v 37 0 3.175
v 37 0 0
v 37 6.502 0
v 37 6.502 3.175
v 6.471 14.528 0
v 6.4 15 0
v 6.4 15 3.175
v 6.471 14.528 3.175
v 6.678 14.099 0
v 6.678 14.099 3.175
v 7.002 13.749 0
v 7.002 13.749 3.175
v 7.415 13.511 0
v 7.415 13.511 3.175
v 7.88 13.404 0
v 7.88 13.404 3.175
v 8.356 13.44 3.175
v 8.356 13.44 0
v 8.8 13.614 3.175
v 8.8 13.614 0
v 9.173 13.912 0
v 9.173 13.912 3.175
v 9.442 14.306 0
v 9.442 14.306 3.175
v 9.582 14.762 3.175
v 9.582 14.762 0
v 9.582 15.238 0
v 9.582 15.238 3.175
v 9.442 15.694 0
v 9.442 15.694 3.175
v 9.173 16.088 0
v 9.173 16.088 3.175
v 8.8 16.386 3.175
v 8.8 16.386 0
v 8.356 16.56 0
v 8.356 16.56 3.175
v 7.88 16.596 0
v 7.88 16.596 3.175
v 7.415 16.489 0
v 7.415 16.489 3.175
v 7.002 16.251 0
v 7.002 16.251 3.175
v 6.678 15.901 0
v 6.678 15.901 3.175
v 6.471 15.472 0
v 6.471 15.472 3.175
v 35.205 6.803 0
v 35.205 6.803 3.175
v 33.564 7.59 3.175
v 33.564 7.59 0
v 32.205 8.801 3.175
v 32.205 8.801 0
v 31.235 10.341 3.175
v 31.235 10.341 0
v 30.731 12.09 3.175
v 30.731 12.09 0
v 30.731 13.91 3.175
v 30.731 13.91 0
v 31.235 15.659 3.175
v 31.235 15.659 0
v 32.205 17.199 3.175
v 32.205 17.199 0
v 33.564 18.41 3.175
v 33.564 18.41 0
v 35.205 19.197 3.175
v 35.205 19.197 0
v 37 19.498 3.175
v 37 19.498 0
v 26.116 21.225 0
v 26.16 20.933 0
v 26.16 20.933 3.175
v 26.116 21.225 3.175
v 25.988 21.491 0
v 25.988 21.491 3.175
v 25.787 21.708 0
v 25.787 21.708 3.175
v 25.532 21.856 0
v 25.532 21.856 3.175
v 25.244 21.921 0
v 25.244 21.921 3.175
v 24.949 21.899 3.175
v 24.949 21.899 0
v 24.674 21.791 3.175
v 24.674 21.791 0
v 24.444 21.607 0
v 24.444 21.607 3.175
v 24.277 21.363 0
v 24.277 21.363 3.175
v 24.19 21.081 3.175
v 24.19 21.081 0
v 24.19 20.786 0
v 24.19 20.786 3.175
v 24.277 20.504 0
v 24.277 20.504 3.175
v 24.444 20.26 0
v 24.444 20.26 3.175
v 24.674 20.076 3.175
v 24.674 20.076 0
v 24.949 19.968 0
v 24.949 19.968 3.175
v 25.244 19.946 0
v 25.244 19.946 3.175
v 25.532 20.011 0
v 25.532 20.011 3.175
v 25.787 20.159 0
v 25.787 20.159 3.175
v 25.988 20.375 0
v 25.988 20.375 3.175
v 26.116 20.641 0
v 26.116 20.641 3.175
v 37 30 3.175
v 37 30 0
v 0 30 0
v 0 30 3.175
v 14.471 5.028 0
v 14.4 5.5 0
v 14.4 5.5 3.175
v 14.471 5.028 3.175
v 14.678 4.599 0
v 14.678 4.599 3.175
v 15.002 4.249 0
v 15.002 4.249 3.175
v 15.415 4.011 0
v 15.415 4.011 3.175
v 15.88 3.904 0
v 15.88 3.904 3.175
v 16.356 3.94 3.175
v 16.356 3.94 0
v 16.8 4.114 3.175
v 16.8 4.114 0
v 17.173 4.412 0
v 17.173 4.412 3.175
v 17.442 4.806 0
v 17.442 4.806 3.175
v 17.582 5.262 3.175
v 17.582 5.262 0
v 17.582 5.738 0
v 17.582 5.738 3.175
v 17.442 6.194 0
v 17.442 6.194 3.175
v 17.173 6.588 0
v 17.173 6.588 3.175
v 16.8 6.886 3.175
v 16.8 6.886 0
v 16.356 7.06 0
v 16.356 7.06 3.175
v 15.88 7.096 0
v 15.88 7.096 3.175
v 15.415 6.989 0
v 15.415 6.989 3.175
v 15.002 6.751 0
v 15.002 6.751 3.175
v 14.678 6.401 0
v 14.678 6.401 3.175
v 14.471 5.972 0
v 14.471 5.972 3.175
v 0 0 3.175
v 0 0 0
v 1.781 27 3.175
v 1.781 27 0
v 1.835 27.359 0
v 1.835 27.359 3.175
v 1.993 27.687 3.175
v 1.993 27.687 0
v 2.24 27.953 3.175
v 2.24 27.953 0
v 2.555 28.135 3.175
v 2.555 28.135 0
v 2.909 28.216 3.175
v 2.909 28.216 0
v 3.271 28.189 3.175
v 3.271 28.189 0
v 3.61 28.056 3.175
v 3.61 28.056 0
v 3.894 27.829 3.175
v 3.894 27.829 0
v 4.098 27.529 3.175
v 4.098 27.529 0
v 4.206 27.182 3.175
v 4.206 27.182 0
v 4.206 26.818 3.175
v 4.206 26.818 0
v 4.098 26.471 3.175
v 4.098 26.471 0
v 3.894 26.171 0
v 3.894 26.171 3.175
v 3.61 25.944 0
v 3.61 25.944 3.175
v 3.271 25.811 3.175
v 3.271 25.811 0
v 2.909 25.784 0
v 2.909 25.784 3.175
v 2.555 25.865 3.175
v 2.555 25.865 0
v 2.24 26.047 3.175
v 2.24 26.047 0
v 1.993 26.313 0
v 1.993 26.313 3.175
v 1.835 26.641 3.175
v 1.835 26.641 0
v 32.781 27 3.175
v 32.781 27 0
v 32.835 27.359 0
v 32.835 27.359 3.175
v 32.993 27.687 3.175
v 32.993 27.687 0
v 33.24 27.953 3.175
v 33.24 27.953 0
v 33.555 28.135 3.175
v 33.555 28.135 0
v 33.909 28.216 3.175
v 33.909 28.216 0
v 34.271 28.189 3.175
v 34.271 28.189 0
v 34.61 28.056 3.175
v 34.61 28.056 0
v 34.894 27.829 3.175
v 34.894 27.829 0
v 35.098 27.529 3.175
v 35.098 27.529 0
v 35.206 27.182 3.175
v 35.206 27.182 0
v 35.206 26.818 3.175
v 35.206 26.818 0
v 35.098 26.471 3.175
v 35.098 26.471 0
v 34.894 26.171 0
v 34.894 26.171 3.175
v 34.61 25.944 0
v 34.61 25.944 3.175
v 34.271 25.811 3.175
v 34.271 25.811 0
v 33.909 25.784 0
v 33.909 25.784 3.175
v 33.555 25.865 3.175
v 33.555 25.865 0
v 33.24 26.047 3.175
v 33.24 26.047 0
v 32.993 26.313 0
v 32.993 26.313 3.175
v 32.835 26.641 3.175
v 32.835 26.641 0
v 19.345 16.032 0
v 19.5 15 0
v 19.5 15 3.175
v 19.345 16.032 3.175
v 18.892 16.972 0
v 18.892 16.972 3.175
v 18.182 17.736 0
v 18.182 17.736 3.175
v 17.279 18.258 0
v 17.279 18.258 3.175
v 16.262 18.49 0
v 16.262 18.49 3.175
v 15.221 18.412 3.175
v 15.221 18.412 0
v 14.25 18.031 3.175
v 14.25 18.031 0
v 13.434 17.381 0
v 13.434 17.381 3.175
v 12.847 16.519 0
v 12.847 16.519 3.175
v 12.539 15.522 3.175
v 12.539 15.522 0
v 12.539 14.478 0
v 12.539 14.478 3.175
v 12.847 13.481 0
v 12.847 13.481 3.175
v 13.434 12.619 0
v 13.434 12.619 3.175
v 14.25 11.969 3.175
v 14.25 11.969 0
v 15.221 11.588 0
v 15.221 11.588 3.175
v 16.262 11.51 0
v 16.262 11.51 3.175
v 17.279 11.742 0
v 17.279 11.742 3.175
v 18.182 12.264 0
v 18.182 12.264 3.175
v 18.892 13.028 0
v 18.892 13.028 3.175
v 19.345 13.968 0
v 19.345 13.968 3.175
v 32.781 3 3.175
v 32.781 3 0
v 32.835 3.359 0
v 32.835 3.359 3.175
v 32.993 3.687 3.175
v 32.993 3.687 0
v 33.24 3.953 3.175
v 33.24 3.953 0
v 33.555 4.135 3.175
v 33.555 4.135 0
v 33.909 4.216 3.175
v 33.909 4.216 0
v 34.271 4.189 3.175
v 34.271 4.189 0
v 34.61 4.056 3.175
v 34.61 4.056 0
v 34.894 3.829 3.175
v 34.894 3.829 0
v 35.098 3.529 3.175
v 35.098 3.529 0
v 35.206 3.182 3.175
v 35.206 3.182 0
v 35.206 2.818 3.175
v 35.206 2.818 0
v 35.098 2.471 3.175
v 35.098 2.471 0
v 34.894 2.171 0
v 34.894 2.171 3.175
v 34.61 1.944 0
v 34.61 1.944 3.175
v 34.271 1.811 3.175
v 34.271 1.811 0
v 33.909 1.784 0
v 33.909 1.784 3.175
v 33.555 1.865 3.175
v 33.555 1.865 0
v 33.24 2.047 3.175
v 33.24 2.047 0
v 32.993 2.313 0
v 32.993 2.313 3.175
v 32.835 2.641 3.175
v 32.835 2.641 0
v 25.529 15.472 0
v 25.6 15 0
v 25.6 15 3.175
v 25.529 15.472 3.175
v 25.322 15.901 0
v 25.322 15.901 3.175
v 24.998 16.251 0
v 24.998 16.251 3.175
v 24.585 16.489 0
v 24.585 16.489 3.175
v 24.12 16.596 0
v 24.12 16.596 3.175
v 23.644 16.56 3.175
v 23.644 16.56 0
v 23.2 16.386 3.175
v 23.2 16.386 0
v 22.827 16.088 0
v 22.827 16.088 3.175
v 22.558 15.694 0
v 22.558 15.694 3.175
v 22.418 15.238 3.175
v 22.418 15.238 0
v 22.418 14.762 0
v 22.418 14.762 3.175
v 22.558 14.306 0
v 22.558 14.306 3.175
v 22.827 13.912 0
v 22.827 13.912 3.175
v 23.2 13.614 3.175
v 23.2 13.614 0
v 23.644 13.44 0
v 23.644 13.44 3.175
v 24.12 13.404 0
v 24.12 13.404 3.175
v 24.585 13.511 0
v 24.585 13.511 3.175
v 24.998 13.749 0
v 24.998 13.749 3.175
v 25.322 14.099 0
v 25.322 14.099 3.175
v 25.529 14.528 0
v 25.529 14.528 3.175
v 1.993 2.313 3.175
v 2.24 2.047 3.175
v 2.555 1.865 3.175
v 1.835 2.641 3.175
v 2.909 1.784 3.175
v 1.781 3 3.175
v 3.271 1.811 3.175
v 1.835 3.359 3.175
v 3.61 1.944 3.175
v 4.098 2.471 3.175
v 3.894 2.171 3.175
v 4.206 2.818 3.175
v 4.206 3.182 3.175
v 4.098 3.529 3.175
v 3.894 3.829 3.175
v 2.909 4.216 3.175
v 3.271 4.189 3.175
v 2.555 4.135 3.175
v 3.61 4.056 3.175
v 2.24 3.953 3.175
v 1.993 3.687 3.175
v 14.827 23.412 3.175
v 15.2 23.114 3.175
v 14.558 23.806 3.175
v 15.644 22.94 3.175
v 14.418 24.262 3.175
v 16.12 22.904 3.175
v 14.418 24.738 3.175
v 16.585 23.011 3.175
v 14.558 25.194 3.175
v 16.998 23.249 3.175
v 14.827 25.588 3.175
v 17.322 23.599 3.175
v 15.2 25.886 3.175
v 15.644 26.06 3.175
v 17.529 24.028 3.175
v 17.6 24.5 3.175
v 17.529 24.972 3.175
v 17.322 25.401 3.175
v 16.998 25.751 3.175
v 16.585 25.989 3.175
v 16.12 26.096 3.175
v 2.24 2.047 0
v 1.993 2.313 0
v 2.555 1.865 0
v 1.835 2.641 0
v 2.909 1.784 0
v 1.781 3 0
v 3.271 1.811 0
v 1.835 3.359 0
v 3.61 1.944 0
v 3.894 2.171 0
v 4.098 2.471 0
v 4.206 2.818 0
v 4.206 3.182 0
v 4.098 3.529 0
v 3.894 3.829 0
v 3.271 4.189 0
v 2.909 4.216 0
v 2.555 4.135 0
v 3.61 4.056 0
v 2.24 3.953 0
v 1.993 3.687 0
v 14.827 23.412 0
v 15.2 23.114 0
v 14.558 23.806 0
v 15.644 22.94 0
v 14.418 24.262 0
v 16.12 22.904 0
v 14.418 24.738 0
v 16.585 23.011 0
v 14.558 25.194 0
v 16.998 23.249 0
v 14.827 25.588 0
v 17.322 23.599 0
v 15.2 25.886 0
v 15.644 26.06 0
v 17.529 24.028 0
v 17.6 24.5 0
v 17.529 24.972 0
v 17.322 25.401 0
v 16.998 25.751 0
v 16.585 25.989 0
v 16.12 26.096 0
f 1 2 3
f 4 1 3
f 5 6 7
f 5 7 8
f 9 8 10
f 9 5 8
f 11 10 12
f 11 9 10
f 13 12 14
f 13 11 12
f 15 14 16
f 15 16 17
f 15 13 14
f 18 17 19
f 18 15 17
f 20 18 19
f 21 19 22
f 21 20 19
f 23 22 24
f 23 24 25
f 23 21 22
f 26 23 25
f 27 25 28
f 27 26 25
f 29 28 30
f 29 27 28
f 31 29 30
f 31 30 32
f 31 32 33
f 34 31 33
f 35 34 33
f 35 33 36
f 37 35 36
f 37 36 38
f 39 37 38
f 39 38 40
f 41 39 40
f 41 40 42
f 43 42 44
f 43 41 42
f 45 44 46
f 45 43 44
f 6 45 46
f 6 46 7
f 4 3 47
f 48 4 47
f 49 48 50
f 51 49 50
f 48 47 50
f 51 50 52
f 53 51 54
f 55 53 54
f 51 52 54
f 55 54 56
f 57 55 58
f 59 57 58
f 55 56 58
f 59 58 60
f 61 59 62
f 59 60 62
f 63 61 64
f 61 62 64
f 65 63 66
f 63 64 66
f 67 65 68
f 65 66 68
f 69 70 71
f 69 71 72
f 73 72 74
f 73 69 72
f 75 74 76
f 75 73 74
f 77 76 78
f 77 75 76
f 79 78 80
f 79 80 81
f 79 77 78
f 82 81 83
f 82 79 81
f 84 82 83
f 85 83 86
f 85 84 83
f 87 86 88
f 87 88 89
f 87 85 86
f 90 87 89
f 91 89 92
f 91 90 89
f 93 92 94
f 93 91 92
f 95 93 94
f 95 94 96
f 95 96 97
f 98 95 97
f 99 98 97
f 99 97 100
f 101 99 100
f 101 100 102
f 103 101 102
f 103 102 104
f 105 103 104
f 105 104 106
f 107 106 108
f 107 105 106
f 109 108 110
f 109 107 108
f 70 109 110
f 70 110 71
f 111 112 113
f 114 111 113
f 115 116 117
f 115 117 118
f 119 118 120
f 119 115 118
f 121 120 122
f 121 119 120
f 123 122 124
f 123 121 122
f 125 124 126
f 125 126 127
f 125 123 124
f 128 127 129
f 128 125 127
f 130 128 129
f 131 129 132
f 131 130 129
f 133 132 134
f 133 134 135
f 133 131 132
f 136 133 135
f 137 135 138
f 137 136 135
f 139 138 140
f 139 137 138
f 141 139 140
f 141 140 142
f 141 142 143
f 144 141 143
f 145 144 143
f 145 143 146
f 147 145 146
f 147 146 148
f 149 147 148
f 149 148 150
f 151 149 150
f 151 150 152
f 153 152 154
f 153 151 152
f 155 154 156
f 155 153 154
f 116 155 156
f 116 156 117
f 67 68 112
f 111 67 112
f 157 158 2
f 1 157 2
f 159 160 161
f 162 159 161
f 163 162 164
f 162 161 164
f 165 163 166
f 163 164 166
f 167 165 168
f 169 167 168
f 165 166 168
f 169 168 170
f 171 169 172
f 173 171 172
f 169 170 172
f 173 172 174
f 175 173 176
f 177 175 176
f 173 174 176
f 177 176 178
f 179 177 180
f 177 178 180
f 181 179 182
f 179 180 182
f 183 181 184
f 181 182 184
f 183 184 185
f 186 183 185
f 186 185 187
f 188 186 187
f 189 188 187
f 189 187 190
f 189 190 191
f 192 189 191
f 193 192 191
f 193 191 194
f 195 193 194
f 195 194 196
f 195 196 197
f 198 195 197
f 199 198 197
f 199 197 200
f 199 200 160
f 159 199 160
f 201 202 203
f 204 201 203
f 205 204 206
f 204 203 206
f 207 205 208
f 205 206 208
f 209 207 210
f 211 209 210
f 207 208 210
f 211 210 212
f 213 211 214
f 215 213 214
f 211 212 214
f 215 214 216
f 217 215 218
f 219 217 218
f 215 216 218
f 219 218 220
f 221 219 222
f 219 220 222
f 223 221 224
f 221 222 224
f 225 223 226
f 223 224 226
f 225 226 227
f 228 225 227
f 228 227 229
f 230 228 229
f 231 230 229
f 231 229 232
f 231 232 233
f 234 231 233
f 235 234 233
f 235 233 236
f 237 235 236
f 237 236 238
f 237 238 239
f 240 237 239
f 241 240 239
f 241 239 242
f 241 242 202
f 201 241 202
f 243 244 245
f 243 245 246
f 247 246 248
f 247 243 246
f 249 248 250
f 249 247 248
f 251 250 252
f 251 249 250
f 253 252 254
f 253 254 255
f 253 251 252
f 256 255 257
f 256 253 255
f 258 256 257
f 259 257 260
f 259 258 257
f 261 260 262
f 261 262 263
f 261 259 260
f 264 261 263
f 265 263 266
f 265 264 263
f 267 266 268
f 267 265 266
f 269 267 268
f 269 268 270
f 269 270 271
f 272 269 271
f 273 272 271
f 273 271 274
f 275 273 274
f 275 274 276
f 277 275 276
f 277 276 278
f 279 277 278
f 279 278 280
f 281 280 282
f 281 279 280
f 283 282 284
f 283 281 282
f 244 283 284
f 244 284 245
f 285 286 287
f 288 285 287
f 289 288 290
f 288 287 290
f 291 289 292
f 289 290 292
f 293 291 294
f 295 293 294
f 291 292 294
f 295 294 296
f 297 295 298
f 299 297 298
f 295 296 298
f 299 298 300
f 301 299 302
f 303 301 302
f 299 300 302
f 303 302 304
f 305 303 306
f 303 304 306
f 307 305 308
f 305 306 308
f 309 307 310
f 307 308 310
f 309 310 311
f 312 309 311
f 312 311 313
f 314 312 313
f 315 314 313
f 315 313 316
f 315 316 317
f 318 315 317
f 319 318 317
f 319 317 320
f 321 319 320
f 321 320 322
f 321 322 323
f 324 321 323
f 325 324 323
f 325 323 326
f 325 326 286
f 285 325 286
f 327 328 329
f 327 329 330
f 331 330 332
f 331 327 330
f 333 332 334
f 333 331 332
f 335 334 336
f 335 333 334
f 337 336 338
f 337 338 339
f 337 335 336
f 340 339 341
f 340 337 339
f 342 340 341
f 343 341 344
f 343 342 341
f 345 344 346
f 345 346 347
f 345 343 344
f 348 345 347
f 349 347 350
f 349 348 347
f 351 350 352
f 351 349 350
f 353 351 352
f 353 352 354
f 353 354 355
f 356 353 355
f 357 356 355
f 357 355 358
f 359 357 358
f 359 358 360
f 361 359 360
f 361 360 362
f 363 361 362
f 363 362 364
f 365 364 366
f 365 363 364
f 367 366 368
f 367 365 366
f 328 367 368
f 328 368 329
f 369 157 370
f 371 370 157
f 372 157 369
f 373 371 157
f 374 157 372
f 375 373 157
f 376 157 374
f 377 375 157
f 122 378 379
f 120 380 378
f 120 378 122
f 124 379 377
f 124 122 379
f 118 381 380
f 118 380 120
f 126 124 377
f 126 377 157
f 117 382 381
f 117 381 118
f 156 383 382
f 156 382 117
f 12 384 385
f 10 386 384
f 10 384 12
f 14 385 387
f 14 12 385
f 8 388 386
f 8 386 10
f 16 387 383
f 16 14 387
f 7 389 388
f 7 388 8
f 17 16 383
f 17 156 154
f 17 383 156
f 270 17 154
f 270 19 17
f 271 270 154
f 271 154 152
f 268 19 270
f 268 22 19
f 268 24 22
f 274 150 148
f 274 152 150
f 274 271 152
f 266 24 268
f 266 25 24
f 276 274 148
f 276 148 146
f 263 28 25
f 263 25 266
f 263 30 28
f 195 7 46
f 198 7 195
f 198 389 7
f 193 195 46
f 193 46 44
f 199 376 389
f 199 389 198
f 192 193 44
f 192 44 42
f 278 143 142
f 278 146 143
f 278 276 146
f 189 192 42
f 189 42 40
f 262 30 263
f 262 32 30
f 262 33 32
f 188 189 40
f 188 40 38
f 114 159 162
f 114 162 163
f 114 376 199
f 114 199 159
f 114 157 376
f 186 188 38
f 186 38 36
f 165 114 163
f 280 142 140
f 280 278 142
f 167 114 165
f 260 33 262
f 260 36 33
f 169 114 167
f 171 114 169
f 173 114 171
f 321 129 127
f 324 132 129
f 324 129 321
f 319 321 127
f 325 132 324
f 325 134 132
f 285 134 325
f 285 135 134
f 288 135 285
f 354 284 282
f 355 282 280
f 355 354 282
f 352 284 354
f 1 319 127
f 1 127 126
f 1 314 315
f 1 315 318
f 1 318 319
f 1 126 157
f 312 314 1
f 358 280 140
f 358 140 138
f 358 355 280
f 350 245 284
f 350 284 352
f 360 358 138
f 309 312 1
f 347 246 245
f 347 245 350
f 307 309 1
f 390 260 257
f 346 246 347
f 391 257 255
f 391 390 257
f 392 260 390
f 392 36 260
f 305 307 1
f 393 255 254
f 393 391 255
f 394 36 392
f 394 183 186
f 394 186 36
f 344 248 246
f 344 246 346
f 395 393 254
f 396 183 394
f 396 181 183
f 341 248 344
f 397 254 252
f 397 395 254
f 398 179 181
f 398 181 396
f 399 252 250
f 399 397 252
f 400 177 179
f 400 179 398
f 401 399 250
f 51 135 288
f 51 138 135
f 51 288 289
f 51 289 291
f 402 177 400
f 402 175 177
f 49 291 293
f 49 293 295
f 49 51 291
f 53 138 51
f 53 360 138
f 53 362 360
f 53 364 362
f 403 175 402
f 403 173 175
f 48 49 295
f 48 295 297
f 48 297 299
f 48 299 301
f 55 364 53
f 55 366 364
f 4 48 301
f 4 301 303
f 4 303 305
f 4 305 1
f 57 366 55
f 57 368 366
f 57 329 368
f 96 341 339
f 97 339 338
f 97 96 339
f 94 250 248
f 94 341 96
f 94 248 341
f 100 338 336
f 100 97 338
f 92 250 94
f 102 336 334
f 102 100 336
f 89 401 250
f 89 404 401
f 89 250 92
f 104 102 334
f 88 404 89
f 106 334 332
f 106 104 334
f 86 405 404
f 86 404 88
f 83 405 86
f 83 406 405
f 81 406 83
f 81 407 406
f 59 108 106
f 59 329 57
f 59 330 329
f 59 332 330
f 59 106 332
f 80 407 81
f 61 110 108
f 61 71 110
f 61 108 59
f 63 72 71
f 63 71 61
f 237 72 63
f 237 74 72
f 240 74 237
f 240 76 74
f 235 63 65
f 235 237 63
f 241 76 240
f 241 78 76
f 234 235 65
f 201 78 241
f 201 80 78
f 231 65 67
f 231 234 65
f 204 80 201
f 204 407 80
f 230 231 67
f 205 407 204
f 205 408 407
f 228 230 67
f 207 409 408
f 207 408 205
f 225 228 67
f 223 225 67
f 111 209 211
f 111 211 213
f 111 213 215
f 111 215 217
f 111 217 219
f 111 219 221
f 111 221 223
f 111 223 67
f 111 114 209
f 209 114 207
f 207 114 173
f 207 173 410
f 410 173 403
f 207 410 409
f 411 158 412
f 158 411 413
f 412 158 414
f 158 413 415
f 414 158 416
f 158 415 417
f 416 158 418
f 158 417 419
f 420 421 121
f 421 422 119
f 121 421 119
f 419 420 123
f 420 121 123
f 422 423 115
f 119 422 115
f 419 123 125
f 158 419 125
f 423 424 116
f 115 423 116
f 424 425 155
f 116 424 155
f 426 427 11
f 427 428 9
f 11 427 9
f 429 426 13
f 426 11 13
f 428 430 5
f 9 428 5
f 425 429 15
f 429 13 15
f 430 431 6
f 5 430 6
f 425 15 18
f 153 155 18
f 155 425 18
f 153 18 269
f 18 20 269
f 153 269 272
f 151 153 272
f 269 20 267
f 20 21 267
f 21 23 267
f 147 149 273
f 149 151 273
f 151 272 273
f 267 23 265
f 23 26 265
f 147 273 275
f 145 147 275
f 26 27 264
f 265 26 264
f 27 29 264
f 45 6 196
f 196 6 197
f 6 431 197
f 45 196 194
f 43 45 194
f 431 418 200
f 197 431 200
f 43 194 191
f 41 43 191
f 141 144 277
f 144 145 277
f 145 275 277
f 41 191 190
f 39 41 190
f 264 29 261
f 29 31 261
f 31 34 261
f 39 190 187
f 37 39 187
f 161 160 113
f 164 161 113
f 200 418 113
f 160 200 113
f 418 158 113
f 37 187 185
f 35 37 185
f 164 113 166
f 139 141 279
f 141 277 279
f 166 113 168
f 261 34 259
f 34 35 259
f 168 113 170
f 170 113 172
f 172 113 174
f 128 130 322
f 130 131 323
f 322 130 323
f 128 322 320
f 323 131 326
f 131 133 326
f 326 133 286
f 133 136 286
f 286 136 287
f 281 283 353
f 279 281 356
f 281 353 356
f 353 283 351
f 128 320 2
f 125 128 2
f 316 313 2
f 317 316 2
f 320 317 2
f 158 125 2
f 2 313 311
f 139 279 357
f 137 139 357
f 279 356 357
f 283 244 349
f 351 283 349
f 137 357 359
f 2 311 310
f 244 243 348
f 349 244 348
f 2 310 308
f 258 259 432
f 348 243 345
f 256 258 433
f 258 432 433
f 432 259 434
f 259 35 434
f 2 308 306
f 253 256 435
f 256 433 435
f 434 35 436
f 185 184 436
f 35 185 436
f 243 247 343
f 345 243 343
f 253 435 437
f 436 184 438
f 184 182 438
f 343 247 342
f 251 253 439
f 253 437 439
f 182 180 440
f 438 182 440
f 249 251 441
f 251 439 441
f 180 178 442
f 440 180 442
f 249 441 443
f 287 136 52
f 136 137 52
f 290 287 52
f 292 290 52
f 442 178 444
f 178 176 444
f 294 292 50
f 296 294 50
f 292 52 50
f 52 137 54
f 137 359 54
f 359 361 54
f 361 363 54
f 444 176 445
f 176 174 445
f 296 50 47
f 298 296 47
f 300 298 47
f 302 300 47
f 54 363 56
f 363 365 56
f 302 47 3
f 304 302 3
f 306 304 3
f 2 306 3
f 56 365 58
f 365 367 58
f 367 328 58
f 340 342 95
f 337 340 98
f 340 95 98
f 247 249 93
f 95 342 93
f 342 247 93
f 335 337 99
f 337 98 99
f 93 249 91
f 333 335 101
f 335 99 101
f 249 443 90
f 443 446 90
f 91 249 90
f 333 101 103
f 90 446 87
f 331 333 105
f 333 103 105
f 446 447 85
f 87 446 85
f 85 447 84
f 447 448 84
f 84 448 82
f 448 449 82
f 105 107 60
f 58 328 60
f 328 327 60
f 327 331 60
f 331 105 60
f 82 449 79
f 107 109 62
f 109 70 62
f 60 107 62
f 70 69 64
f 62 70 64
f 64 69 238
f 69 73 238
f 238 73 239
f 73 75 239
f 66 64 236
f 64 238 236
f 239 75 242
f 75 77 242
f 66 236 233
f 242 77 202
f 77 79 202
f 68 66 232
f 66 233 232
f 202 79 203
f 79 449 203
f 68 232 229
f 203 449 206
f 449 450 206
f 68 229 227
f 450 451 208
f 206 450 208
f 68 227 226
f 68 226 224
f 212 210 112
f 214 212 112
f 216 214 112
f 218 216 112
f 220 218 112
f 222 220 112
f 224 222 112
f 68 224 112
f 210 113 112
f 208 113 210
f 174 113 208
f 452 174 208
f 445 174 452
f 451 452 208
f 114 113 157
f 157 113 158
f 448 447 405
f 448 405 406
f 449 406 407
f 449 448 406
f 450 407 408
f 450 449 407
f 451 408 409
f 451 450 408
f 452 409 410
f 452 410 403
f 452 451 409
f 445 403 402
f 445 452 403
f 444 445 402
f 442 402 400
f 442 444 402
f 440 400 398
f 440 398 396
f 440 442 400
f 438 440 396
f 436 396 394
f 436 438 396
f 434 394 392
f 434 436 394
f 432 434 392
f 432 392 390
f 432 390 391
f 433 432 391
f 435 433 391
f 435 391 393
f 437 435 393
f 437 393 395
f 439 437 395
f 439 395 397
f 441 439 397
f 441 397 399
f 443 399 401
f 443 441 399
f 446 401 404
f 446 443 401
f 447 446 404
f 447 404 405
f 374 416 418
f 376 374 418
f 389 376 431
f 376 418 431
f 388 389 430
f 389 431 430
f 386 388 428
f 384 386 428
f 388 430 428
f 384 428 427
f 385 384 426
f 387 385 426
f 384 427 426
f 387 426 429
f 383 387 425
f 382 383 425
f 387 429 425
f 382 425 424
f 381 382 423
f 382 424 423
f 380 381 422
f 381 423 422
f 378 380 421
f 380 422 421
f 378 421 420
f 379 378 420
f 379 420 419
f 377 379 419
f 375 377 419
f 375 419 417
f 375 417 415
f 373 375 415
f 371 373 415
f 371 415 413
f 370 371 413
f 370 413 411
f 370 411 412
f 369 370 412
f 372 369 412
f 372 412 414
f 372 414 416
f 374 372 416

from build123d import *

# Parameters (mm, degrees)
SKETCH1_R                 = 0.9906
SKETCH1_R_2               = 1.6
SKETCH1_R_3               = 3.5
BOSS_EXTRUDE2_DEPTH       = 3.175
F_2_CLEARANCE_HOLE1_D     = 2.4384
F_2_CLEARANCE_HOLE1_DEPTH = 3.302
F_2_CLEARANCE_HOLE1_TIP   = 0.732569267


with BuildPart() as part:
    # Sketch1 → Boss-Extrude2 (new body)
    with BuildSketch(Plane.XY):
        with BuildLine():
            Line((0, 0), (37, 0))
            Line((37, 0), (37, 6.50213794))
            ThreePointArc((37, 6.50213794), (30.666699296, 13), (37, 19.49786206))
            Line((37, 19.49786206), (37, 30))
            Line((37, 30), (0, 30))
            Line((0, 30), (0, 0))
        make_face()
        with Locations((25.169778966, 20.933400182)):
            Circle(SKETCH1_R, mode=Mode.SUBTRACT)
        with Locations((16, 24.5)):
            Circle(SKETCH1_R_2, mode=Mode.SUBTRACT)
        with Locations((24, 15)):
            Circle(SKETCH1_R_2, mode=Mode.SUBTRACT)
        with Locations(Location((16, 5.5, 0), (0, 0, 180))):
            Circle(SKETCH1_R_2, mode=Mode.SUBTRACT)
        with Locations(Location((8, 15, 0), (0, 0, 180))):
            Circle(SKETCH1_R_2, mode=Mode.SUBTRACT)
        with Locations((16, 15)):
            Circle(SKETCH1_R_3, mode=Mode.SUBTRACT)
    extrude(amount=BOSS_EXTRUDE2_DEPTH)

    # #2 Clearance Hole1
    with Locations(Plane.XY.offset(3.175)):
        with Locations((3, 27), (3, 3), (34, 3), (34, 27)):
            Hole(F_2_CLEARANCE_HOLE1_D / 2, depth=F_2_CLEARANCE_HOLE1_DEPTH)
            with Locations((0, 0, -(F_2_CLEARANCE_HOLE1_DEPTH + F_2_CLEARANCE_HOLE1_TIP / 2))):  # 118° drill point
                Cone(0, F_2_CLEARANCE_HOLE1_D / 2, F_2_CLEARANCE_HOLE1_TIP, mode=Mode.SUBTRACT)


solid = part.part
